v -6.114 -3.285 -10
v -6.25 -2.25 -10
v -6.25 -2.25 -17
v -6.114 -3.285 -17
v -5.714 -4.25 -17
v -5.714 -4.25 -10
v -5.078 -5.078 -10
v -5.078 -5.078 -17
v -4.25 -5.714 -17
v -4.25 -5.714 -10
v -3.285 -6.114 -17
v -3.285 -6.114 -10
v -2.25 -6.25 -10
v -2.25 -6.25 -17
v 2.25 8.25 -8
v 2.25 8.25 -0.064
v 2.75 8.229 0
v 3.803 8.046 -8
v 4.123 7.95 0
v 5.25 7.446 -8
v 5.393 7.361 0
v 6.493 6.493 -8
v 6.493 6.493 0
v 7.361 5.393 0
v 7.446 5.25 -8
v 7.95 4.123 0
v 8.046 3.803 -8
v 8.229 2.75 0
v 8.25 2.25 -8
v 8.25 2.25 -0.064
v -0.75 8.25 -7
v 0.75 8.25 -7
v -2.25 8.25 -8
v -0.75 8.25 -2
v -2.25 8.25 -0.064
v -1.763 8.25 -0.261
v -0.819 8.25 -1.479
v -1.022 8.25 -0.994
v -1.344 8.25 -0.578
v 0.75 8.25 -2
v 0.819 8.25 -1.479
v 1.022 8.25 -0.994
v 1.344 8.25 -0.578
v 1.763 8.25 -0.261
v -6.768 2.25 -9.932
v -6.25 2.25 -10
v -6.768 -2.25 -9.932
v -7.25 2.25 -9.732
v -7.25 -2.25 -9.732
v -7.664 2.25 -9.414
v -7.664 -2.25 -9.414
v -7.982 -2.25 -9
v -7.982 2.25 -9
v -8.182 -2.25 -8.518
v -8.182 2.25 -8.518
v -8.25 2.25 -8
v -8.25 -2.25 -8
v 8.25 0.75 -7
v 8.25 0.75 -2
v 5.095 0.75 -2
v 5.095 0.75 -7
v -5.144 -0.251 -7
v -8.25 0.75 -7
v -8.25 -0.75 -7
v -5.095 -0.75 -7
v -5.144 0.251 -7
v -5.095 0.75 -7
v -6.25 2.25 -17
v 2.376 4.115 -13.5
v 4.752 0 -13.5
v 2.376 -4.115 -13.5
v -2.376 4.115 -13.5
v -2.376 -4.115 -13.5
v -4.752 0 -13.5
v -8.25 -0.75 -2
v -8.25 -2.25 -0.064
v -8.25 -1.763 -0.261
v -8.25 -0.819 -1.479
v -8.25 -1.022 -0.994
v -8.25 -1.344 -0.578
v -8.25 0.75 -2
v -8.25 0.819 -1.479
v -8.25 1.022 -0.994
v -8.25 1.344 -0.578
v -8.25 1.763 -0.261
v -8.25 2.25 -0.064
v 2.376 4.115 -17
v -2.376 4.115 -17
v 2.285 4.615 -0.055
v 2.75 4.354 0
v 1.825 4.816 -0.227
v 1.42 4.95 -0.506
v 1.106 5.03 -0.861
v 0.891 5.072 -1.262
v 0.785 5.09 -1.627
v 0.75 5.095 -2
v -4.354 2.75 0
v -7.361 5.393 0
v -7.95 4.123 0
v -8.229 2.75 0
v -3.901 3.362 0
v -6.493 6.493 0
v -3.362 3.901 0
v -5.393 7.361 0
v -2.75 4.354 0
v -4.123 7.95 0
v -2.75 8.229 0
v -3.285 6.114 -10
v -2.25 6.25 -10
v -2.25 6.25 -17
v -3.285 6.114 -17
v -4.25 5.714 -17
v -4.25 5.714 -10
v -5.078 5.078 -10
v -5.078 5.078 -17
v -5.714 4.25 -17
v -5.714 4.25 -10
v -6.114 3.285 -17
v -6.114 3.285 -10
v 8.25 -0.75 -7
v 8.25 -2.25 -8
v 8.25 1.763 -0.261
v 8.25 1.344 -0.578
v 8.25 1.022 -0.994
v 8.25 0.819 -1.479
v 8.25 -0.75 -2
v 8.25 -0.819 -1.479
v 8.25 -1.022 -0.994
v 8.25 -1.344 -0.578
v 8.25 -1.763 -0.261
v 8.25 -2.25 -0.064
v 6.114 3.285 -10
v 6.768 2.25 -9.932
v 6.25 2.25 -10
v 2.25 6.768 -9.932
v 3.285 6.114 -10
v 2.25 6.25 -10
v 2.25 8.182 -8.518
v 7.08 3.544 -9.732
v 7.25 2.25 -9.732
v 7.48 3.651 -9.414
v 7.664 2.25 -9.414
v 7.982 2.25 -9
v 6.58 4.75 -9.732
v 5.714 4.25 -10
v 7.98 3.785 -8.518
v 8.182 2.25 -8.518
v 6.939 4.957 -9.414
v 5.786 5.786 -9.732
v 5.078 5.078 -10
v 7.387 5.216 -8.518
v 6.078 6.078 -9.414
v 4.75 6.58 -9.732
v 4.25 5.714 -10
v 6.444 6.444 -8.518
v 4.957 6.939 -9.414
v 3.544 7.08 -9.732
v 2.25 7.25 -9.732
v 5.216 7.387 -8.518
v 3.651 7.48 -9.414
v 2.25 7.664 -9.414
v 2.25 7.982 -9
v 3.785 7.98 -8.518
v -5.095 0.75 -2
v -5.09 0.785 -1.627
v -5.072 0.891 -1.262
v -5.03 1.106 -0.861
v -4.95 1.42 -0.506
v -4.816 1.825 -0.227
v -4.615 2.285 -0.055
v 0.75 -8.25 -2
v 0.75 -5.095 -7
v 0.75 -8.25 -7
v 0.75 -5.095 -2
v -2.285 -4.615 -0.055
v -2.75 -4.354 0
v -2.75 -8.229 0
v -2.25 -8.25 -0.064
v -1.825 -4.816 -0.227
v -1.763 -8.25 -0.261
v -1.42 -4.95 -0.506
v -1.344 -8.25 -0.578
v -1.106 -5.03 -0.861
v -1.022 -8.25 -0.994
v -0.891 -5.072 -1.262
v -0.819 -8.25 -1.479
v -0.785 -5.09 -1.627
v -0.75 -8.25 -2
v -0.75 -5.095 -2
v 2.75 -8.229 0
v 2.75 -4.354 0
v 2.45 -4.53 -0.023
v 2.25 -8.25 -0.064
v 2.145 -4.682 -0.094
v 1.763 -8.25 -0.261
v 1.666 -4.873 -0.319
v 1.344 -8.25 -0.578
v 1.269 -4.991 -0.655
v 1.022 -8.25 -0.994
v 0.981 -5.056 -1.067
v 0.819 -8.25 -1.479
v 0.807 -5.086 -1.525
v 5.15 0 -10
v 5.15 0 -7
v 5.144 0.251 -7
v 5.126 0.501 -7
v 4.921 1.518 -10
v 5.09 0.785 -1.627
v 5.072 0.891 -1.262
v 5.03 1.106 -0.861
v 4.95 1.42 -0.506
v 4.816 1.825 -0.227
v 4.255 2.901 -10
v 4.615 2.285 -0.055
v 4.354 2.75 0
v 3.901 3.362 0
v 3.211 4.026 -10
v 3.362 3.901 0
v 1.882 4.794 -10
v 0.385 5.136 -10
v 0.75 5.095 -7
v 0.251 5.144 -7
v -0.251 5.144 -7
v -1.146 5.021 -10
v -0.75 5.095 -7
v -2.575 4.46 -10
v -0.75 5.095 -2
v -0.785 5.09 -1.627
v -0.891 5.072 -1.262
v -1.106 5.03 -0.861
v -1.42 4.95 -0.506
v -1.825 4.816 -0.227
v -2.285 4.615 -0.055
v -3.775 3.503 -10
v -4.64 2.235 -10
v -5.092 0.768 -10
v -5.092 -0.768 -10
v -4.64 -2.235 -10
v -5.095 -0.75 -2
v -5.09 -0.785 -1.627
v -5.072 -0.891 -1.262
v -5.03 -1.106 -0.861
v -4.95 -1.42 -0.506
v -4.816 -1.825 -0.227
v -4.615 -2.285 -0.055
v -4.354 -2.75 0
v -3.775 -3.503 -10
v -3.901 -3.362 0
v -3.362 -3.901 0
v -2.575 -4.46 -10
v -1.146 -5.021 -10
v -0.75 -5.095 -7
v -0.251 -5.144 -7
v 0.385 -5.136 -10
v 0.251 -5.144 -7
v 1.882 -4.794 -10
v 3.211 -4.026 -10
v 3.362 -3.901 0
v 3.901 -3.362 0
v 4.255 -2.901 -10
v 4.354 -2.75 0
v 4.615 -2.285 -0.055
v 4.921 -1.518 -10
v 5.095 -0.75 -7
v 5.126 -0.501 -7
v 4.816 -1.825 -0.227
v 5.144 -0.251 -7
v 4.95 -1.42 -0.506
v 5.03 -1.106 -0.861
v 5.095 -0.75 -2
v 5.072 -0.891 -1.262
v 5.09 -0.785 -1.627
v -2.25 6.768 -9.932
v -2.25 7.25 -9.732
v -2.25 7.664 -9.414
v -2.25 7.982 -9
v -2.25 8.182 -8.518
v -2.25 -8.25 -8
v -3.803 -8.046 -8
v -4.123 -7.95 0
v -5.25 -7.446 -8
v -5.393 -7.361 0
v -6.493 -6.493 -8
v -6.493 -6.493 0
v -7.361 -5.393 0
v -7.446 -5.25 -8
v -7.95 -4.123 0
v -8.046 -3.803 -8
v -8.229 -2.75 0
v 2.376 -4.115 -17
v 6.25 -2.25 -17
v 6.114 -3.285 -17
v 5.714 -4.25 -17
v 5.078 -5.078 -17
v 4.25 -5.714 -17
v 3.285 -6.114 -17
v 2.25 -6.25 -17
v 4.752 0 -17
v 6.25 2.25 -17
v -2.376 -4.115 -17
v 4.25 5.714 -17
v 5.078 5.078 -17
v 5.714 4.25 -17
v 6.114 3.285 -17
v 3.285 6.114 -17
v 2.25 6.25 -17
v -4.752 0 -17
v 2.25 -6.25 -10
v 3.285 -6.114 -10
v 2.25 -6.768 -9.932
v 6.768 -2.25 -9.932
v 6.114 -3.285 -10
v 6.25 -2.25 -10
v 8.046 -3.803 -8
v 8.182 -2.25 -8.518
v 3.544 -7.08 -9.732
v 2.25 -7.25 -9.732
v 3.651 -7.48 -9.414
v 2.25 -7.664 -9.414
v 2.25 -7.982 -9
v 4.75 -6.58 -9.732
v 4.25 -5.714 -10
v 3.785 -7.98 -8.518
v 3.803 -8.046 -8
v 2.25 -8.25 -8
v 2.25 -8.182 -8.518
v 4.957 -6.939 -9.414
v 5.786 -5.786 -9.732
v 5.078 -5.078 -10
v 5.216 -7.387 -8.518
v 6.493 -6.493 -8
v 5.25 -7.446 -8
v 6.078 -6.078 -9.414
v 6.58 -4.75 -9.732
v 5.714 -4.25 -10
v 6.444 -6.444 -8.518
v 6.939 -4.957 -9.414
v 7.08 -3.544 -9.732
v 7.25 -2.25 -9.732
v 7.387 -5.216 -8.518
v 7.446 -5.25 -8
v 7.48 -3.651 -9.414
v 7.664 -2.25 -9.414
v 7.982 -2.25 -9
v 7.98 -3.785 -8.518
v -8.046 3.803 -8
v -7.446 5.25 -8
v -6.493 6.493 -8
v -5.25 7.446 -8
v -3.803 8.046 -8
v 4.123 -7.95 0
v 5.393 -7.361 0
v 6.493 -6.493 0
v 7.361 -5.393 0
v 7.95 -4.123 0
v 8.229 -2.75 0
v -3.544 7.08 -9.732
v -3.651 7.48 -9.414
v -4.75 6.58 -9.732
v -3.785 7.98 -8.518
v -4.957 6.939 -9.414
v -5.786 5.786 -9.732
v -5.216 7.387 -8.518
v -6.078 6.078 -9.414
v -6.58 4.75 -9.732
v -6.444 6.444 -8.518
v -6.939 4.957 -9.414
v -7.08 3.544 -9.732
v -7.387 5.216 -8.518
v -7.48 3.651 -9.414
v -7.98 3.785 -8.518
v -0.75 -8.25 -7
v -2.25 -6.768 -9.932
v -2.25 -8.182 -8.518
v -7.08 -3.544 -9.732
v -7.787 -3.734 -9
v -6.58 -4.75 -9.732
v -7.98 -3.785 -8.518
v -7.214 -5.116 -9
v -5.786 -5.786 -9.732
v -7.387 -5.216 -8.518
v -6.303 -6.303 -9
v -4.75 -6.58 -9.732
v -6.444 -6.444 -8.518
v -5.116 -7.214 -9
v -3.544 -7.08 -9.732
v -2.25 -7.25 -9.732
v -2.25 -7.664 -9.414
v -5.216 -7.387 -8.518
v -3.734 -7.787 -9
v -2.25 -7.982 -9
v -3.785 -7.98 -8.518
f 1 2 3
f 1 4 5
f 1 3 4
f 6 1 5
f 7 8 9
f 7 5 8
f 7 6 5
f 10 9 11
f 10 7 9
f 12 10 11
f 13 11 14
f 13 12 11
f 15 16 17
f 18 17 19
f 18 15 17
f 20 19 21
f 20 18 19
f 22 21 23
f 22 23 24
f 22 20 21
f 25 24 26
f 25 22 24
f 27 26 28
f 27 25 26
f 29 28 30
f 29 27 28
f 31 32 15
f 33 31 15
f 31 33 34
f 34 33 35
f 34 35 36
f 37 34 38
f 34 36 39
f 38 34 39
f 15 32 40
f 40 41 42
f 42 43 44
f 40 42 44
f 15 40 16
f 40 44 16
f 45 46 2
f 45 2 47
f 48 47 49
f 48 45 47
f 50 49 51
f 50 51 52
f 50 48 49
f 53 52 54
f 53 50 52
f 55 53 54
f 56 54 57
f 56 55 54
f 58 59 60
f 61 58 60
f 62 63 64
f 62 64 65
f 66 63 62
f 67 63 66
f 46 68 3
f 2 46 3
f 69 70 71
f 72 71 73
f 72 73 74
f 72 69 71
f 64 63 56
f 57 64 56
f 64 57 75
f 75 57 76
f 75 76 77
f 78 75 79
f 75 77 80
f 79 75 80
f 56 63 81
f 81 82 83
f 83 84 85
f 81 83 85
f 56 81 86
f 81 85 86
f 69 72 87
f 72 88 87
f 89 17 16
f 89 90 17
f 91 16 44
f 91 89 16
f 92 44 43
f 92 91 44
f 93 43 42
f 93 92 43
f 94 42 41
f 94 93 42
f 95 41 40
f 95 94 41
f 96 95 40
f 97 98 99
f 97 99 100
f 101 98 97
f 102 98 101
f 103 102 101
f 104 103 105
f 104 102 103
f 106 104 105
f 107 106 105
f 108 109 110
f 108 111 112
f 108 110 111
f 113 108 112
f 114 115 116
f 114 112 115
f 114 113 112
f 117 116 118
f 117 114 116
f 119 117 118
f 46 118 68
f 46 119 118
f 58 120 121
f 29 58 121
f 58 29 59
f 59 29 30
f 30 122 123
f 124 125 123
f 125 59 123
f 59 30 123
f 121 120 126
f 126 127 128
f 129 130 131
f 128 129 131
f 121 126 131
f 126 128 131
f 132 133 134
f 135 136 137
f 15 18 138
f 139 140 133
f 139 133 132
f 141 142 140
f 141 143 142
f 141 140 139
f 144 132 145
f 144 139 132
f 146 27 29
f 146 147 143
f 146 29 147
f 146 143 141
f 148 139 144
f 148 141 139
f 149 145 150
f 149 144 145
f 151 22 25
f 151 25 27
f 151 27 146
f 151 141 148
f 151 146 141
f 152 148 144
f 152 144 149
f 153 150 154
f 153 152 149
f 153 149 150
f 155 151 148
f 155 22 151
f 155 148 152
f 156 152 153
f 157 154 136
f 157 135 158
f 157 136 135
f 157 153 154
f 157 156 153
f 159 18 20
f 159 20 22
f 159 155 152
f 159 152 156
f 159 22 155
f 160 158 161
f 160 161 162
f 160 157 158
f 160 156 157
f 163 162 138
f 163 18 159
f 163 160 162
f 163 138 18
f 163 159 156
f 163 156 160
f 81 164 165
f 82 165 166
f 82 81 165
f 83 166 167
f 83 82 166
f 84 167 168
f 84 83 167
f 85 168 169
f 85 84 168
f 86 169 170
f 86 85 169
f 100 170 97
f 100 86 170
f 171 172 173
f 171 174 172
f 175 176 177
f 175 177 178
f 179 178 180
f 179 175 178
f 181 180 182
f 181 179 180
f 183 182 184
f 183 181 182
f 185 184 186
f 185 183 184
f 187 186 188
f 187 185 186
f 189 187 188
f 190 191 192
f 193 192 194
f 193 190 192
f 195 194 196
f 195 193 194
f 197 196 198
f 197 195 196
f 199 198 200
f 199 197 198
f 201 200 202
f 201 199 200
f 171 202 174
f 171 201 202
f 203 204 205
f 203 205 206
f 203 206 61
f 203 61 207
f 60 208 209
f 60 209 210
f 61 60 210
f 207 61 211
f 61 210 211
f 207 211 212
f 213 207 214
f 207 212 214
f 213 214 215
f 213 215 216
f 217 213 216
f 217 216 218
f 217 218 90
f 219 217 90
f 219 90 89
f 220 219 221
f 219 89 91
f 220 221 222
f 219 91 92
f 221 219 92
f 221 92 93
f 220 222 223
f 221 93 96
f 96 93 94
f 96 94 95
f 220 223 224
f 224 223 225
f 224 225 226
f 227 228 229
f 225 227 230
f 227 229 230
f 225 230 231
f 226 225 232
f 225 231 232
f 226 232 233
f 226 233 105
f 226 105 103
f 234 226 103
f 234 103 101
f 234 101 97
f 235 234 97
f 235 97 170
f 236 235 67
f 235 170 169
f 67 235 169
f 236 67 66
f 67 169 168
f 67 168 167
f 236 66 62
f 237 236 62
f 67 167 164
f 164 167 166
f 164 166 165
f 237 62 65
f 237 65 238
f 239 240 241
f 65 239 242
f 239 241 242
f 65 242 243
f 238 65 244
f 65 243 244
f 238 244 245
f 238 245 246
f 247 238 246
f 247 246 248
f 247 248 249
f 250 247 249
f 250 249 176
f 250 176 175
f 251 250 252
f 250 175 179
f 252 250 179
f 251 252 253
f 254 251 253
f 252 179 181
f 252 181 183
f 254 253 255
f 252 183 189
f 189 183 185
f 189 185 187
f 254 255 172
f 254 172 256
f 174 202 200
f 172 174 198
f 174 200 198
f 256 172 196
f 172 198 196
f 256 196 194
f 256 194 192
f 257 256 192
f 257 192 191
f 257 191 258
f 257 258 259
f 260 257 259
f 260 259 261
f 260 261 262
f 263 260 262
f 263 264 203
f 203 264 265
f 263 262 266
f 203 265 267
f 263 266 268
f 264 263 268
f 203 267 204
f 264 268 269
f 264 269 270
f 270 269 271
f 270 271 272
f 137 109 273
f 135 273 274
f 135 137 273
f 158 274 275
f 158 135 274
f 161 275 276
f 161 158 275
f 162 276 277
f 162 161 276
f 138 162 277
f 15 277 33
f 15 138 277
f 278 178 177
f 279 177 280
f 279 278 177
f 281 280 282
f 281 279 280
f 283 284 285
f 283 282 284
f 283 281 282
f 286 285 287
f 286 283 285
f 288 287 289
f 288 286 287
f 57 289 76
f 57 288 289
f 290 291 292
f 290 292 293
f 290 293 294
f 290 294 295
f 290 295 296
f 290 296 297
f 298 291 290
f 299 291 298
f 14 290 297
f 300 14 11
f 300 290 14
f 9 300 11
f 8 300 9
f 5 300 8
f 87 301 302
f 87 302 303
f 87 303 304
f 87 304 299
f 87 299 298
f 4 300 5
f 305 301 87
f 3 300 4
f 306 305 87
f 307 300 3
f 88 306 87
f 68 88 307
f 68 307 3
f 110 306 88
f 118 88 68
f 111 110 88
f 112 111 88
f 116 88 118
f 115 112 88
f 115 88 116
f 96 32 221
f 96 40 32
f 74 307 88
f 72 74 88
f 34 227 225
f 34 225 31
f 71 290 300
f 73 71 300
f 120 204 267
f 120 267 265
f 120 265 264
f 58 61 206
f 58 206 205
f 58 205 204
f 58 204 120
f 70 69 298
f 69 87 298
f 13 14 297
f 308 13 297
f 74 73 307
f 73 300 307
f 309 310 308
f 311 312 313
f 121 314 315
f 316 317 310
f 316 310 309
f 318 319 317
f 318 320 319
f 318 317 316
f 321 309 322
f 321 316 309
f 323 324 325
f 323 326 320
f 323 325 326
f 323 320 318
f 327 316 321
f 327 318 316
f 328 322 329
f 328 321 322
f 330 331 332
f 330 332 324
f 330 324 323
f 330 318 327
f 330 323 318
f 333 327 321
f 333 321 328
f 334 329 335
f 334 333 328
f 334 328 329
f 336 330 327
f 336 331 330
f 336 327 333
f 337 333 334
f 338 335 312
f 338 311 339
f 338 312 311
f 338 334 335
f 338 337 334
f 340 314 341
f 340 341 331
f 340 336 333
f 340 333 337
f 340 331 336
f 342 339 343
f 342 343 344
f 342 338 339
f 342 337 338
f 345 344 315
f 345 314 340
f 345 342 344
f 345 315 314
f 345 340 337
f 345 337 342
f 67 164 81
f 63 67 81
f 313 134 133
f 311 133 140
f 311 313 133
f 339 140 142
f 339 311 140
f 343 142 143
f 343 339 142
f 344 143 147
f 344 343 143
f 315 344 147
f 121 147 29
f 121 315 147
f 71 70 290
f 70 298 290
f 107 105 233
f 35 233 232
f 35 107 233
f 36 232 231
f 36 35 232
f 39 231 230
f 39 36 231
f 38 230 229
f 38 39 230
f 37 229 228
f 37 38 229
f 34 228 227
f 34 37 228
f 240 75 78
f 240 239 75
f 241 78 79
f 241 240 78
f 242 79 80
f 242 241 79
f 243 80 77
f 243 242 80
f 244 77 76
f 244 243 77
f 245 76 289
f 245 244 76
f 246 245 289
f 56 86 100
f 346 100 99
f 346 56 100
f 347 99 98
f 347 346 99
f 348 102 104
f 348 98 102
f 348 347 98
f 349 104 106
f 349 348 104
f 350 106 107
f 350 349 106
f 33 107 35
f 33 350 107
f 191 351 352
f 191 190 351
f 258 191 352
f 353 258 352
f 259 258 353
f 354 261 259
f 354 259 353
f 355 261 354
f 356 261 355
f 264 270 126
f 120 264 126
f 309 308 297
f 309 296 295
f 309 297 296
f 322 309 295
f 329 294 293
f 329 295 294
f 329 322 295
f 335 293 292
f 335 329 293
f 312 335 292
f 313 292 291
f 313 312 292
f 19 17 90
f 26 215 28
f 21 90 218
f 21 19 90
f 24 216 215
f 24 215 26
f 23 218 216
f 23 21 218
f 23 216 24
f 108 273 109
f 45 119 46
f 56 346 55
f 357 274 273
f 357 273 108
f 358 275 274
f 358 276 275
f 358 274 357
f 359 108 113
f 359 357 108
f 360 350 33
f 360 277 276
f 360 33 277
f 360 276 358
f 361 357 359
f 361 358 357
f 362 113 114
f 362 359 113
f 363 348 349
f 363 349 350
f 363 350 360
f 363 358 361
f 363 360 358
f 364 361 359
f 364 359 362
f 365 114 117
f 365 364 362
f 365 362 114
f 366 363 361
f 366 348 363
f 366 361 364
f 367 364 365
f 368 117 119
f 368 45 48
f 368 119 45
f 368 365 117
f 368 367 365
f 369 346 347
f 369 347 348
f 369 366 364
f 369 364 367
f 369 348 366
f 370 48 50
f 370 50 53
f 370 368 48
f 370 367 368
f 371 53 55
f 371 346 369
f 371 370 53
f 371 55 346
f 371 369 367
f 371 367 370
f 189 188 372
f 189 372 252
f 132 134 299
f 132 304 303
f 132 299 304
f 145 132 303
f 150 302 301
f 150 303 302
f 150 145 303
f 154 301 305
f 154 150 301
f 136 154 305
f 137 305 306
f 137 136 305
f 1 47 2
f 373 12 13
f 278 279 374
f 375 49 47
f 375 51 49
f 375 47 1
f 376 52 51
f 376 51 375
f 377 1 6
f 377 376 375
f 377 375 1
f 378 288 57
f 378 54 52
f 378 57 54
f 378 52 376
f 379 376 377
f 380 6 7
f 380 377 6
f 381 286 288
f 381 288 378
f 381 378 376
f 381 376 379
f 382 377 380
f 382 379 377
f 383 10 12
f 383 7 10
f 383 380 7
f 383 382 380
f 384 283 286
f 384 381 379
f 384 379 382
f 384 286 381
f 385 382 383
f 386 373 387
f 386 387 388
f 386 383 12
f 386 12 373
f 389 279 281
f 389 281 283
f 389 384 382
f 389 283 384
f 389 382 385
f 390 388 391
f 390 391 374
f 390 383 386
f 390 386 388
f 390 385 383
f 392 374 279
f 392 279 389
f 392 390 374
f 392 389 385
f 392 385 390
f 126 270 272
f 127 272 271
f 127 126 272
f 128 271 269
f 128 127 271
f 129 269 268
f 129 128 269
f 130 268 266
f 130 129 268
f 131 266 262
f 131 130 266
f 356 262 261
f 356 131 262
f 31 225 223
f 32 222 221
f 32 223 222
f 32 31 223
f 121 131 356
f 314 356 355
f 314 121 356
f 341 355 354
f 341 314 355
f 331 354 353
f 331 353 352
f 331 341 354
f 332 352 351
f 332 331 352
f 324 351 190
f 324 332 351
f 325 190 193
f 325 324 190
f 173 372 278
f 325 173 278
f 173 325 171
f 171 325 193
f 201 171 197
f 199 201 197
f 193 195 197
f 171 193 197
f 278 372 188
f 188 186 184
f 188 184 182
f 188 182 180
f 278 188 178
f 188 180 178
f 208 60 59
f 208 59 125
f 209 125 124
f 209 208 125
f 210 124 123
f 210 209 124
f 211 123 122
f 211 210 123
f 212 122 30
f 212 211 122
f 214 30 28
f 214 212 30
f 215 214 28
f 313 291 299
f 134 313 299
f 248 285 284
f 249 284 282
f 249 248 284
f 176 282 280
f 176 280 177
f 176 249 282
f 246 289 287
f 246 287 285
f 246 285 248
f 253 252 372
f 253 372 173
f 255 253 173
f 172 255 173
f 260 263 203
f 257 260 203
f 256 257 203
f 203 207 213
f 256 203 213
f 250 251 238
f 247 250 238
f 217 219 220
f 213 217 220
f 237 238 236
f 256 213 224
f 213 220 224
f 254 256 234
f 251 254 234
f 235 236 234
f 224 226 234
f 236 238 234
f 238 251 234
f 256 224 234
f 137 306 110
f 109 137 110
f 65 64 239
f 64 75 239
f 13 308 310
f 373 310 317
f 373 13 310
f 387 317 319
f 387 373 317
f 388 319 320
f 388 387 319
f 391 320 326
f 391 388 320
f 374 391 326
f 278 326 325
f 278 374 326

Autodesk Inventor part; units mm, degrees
ref_plane "YZ Plane" through (0, 0, 0) normal (1, 0, 0) x (0, 1, 0)
ref_plane "XZ Plane" through (0, 0, 0) normal (0, 1, 0) x (-1, 0, 0)
ref_plane "XY Plane" through (0, 0, 0) normal (0, 0, 1) x (1, 0, 0)
sketch "Sketch1" plane through (0, 0, 0) normal (0, 0, 1) x (1, 0, 0)
  circle A0 centre (0, 0) radius 5.15
  line L0 (-8.25, 8.25) -> (8.25, 8.25)
  line L1 (8.25, 8.25) -> (8.25, -8.25)
  line L2 (8.25, -8.25) -> (-8.25, -8.25)
  line L3 (-8.25, -8.25) -> (-8.25, 8.25)
  line L4 (-8.25, 8.25) -> (8.25, -8.25) construction
  line L5 (8.25, 8.25) -> (-8.25, -8.25) construction
  line L6 (0.75, -8.25) -> (-0.75, -8.25)
  line L7 (-0.75, -8.25) -> (-0.75, 8.25)
  line L8 (-0.75, 8.25) -> (0.75, 8.25)
  line L9 (0.75, 8.25) -> (0.75, -8.25)
  line L10 (0.75, -8.25) -> (-0.75, 8.25) construction
  line L11 (-0.75, -8.25) -> (0.75, 8.25) construction
  line L12 (8.25, 0.75) -> (-8.25, 0.75)
  line L13 (-8.25, 0.75) -> (-8.25, -0.75)
  line L14 (-8.25, -0.75) -> (8.25, -0.75)
  line L15 (8.25, -0.75) -> (8.25, 0.75)
  line L16 (8.25, 0.75) -> (-8.25, -0.75) construction
  line L17 (-8.25, 0.75) -> (8.25, -0.75) construction
  point P0 (2.2177, -5.7994)
  point P1 (6.5123, -1.5048)
  point P2 (9.7177, -1.5048)
  point P3 (9.7177, -0.0048)
  point P4 (6.5123, -0.0048)
  point P5 (2.2177, 4.2897)
  point P6 (2.2177, 7.4952)
  point P7 (0.7177, 4.2897)
  point P8 (-3.5768, -0.0048)
  point P9 (-6.7823, -0.0048)
  point P10 (-3.5768, -1.5048)
  point P11 (0.7177, -5.7994)
  point P12 (0.7177, -9.0048)
  point P13 (2.2177, -9.0048)
  point P14 (0.75, -5.0951)
  point P15 (-0.75, -5.0951)
  point P16 (5.0951, -0.75)
  point P17 (5.0951, 0.75)
  point P18 (-5.0951, -0.75)
  point P19 (-5.0951, 0.75)
  point P20 (0.75, 5.0951)
  point P21 (-0.75, 5.0951)
  dimension "d0" = 10.3
  dimension "d1" = 16.5
  dimension "d2" = 1.5
  dimension "d3" = 1.5
  dimension "d4" = 16.5
extrude "face" add sketch "Sketch1" against normal blind 10 contours A0 L12 L1 L14 | A0 L9 L0 L1 L12 | L14 L1 L2 L9 A0 | A0 L7 L0 L9 | L9 L2 L7 A0 | A0 L12 L3 L0 L7 | L7 L2 L3 L14 A0 | A0 L14 L3 L12
extrude "Extrusion2" cut sketch "Sketch1" against normal blind 7 contours A0 L12 L1 L14 | A0 L7 L0 L9 | L9 L2 L7 A0 | A0 L14 L3 L12
fillet "Fillet1" radius 6 4 edges at (-8.25, 8.25, -5) (8.25, -8.25, -5) (8.25, 8.25, -5) (-8.25, -8.25, -5)
fillet "Fillet2" radius 2 8 edges at (-8.25, 0, -10) (-6.4926, -6.4926, -10) (0, -8.25, -10) (6.4926, -6.4926, -10) (8.25, 0, -10) (6.4926, 6.4926, -10) (0, 8.25, -10) (-6.4926, 6.4926, -10)
fillet "Fillet4" radius 2 8 edges at (0.75, -6.6725, 0) (-0.75, -6.6725, 0) (-6.6725, -0.75, 0) (-6.6725, 0.75, 0) (-0.75, 6.6725, 0) (0.75, 6.6725, 0) (6.6725, 0.75, 0) (6.6725, -0.75, 0)
sketch "Sketch6" plane through (0, 0, -10) normal (0, 0, -1) x (-1, 0, 0)
  circle A0 centre (0, 0) radius 5.15 projected
  line L0 (6.25, 2.25) -> (6.25, -2.25) projected
  arc A1 (6.25, 2.25) -> (2.25, 6.25) centre (2.25, 2.25) ccw projected
  line L1 (-2.25, 6.25) -> (2.25, 6.25) projected
  arc A2 (-2.25, 6.25) -> (-6.25, 2.25) centre (-2.25, 2.25) ccw projected
  line L2 (-6.25, -2.25) -> (-6.25, 2.25) projected
  arc A3 (-6.25, -2.25) -> (-2.25, -6.25) centre (-2.25, -2.25) ccw projected
  line L3 (2.25, -6.25) -> (-2.25, -6.25) projected
  arc A4 (2.25, -6.25) -> (6.25, -2.25) centre (2.25, -2.25) ccw projected
extrude "Extrusion9" add sketch "Sketch6" along normal blind 7 contours A0 | L0 A4 L3 A3 L2 A2 L1 A1
sketch "Sketch7" plane through (0, 0, -17) normal (0, 0, -1) x (-1, 0, 0)
  line L0 (4.5207, 0) -> (2.2603, -3.915)
  line L1 (2.2603, -3.915) -> (-2.2603, -3.915)
  line L2 (-2.2603, -3.915) -> (-4.5207, 0)
  line L3 (-4.5207, 0) -> (-2.2603, 3.915)
  line L4 (-2.2603, 3.915) -> (2.2603, 3.915)
  line L5 (2.2603, 3.915) -> (4.5207, 0)
  line L6 (2.3758, -4.115) -> (4.7516, 0)
  line L7 (4.7516, 0) -> (2.3758, 4.115)
  line L8 (2.3758, 4.115) -> (-2.3758, 4.115)
  line L9 (-2.3758, 4.115) -> (-4.7516, 0)
  line L10 (-4.7516, 0) -> (-2.3758, -4.115)
  line L11 (-2.3758, -4.115) -> (2.3758, -4.115)
  circle A0 centre (0, 0) radius 3.5
  dimension "d34" = 7.83
  dimension "d35" = 0.2
  dimension "d38" = 7
extrude "Extrusion10" cut sketch "Sketch7" against normal blind 3.5 contours L0 L1 L2 L3 L4 L5 | L11 L10 L9 L8 L7 L6 | A0
sketch "Sketch8" plane through (0, 0, -10) normal (0, 0, 1) x (1, 0, 0)
  line L0 (4.5207, 0) -> (2.2603, -3.915)
  line L1 (2.2603, -3.915) -> (-2.2603, -3.915)
  line L2 (-2.2603, -3.915) -> (-4.5207, 0)
  line L3 (-4.5207, 0) -> (-2.2603, 3.915)
  line L4 (-2.2603, 3.915) -> (2.2603, 3.915)
  line L5 (2.2603, 3.915) -> (4.5207, 0)
  line L6 (2.4335, -4.215) -> (4.8671, 0)
  line L7 (4.8671, 0) -> (2.4335, 4.215)
  line L8 (2.4335, 4.215) -> (-2.4335, 4.215)
  line L9 (-2.4335, 4.215) -> (-4.8671, 0)
  line L10 (-4.8671, 0) -> (-2.4335, -4.215)
  line L11 (-2.4335, -4.215) -> (2.4335, -4.215)
  circle A0 centre (0, 0) radius 3.5
  dimension "d41" = 7.83
  dimension "d42" = 0.3
  dimension "d43" = 7
extrude "Extrusion12" [suppressed]
sketch "Sketch9" plane through (0, 0, -17) normal (0, 0, -1) x (-1, 0, 0)
  circle A0 centre (0, 0) radius 2.6
  circle A1 centre (0, 0) radius 4
  dimension "d46" = 5.2
  dimension "d47" = 8
extrude "Extrusion13" [suppressed]
extrude "Extrusion14" [suppressed]
properties part number "adapter-02"
